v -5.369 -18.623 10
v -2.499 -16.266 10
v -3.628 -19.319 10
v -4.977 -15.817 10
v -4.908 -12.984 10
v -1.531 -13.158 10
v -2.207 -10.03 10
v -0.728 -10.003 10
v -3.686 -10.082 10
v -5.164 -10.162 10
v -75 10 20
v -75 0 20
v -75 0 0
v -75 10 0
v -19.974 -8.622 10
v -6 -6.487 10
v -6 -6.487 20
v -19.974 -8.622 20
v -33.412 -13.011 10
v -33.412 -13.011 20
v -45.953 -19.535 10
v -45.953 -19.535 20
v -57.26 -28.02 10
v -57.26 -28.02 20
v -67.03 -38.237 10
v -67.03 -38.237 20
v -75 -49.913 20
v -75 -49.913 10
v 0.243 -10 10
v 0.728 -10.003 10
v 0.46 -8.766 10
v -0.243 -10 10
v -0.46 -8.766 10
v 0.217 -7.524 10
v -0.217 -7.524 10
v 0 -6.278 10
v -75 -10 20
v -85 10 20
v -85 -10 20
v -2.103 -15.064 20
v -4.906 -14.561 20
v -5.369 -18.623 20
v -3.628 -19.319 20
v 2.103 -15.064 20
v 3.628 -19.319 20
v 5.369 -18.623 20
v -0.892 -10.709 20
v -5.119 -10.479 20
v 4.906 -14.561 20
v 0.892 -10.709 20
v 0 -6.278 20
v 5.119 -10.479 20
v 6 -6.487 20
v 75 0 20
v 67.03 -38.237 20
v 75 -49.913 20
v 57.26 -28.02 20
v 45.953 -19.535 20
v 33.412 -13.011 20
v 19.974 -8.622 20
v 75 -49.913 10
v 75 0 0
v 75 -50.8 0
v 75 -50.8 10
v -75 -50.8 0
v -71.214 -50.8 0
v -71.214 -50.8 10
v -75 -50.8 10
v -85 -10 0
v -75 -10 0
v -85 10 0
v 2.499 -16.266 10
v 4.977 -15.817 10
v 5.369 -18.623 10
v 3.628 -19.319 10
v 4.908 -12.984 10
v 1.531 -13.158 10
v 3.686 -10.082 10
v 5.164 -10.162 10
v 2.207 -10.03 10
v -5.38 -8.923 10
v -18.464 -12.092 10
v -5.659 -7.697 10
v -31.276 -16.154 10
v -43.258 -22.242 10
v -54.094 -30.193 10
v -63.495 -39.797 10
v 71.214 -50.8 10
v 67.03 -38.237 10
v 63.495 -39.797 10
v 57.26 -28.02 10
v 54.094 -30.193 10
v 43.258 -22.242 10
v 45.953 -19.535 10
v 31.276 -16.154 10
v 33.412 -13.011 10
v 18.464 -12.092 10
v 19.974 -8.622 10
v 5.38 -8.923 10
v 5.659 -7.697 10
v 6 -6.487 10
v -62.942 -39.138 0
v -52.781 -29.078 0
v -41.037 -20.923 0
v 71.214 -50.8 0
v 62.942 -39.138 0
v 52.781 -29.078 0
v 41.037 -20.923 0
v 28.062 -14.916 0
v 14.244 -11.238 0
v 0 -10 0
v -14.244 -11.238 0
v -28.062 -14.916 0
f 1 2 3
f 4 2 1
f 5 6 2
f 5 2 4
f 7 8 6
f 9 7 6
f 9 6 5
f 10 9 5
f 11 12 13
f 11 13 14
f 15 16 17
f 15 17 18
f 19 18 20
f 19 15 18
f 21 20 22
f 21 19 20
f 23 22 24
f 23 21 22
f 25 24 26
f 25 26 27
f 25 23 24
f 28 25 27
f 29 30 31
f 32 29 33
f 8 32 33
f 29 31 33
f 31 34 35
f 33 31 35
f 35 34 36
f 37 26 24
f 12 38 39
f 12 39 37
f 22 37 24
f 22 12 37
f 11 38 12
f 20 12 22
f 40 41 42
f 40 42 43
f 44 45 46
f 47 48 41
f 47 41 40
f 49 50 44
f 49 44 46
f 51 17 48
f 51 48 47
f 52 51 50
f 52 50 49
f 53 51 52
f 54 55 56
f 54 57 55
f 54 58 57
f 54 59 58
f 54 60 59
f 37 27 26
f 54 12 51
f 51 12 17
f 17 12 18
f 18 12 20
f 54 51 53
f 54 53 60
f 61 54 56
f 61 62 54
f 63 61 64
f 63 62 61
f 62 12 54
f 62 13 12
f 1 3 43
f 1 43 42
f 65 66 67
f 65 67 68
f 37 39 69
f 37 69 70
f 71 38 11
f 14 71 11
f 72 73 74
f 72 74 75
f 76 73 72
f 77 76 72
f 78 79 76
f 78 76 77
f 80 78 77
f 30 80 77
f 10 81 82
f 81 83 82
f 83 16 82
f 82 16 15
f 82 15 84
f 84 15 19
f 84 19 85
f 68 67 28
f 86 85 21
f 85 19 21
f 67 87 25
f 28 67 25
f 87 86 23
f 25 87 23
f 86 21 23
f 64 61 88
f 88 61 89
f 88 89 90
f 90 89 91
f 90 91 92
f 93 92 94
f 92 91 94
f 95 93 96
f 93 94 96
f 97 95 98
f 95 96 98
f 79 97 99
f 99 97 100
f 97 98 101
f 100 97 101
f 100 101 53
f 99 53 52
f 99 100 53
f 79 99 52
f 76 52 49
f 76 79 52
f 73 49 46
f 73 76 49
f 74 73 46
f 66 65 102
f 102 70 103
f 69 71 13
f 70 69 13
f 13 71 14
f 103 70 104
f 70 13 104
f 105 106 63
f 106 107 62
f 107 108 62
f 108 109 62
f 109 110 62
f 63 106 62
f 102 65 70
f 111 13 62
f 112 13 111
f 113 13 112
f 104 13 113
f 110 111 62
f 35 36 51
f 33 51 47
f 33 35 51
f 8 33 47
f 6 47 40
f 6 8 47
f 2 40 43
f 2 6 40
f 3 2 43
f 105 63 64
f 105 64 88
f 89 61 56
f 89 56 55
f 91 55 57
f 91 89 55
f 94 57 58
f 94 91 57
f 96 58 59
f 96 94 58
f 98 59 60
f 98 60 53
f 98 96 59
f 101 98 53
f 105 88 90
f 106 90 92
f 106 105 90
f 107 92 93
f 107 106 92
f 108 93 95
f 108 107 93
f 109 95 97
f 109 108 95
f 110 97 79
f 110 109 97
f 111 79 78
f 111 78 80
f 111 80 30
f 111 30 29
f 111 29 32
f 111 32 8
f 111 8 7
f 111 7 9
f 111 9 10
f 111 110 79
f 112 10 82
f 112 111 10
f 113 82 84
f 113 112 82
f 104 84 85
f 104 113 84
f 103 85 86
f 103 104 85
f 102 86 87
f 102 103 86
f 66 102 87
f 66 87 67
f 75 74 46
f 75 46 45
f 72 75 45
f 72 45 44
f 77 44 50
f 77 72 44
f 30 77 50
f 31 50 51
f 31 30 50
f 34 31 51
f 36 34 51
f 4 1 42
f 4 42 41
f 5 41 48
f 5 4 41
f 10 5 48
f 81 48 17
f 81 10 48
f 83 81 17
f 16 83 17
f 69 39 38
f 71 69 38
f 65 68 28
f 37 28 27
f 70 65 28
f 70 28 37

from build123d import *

# Parameters (mm, degrees)
BOSS_EXTRUDE1_DEPTH = 10
BOSS_EXTRUDE2_DEPTH = 10
SKETCH3_W           = 10
SKETCH3_H           = 20
BOSS_EXTRUDE3_DEPTH = 20


with BuildPart() as part:
    # Sketch1 → Boss-Extrude1 (new body)
    with BuildSketch(Plane.XY):
        with BuildLine():
            Line((-75, 0), (75, 0))
            Line((75, 0), (75, -50.8))
            Line((75, -50.8), (71.214043559, -50.8))
            ThreePointArc((71.214043559, -50.8), (0, -10), (-71.214043559, -50.8))
            Line((-71.214043559, -50.8), (-75, -50.8))
            Line((-75, -50.8), (-75, 0))
        make_face()
    extrude(amount=BOSS_EXTRUDE1_DEPTH)

    # Sketch2 → Boss-Extrude2 (add)
    with BuildSketch(Plane.XY.offset(10)):
        with BuildLine():
            Line((75, 0), (75, -49.913046695))
            ThreePointArc((75, -49.913046695), (45.953391498, -19.534963213), (6, -6.486594379))
            ThreePointArc((6, -6.486594379), (4.927947794, -12.515421427), (5.368573056, -18.622949642))
            Line((5.368573056, -18.622949642), (3.627612554, -19.318821125))
            ThreePointArc((3.627612554, -19.318821125), (1.458266232, -12.897160035), (0, -6.277699769))
            ThreePointArc((0, -6.277699769), (-1.458266232, -12.897160035), (-3.627612554, -19.318821125))
            Line((-3.627612554, -19.318821125), (-5.368573056, -18.622949642))
            ThreePointArc((-5.368573056, -18.622949642), (-4.927947794, -12.515421427), (-6, -6.486594379))
            ThreePointArc((-6, -6.486594379), (-45.953391498, -19.534963213), (-75, -49.913046695))
            Line((-75, -49.913046695), (-75, 0))
            Line((-75, 0), (75, 0))
        make_face()
    extrude(amount=BOSS_EXTRUDE2_DEPTH)

    # Sketch3 → Boss-Extrude3 (add)
    with BuildSketch(Plane.XY.offset(20)):
        with Locations((-80, 0)):
            Rectangle(SKETCH3_W, SKETCH3_H)
    extrude(amount=-BOSS_EXTRUDE3_DEPTH)


solid = part.part
